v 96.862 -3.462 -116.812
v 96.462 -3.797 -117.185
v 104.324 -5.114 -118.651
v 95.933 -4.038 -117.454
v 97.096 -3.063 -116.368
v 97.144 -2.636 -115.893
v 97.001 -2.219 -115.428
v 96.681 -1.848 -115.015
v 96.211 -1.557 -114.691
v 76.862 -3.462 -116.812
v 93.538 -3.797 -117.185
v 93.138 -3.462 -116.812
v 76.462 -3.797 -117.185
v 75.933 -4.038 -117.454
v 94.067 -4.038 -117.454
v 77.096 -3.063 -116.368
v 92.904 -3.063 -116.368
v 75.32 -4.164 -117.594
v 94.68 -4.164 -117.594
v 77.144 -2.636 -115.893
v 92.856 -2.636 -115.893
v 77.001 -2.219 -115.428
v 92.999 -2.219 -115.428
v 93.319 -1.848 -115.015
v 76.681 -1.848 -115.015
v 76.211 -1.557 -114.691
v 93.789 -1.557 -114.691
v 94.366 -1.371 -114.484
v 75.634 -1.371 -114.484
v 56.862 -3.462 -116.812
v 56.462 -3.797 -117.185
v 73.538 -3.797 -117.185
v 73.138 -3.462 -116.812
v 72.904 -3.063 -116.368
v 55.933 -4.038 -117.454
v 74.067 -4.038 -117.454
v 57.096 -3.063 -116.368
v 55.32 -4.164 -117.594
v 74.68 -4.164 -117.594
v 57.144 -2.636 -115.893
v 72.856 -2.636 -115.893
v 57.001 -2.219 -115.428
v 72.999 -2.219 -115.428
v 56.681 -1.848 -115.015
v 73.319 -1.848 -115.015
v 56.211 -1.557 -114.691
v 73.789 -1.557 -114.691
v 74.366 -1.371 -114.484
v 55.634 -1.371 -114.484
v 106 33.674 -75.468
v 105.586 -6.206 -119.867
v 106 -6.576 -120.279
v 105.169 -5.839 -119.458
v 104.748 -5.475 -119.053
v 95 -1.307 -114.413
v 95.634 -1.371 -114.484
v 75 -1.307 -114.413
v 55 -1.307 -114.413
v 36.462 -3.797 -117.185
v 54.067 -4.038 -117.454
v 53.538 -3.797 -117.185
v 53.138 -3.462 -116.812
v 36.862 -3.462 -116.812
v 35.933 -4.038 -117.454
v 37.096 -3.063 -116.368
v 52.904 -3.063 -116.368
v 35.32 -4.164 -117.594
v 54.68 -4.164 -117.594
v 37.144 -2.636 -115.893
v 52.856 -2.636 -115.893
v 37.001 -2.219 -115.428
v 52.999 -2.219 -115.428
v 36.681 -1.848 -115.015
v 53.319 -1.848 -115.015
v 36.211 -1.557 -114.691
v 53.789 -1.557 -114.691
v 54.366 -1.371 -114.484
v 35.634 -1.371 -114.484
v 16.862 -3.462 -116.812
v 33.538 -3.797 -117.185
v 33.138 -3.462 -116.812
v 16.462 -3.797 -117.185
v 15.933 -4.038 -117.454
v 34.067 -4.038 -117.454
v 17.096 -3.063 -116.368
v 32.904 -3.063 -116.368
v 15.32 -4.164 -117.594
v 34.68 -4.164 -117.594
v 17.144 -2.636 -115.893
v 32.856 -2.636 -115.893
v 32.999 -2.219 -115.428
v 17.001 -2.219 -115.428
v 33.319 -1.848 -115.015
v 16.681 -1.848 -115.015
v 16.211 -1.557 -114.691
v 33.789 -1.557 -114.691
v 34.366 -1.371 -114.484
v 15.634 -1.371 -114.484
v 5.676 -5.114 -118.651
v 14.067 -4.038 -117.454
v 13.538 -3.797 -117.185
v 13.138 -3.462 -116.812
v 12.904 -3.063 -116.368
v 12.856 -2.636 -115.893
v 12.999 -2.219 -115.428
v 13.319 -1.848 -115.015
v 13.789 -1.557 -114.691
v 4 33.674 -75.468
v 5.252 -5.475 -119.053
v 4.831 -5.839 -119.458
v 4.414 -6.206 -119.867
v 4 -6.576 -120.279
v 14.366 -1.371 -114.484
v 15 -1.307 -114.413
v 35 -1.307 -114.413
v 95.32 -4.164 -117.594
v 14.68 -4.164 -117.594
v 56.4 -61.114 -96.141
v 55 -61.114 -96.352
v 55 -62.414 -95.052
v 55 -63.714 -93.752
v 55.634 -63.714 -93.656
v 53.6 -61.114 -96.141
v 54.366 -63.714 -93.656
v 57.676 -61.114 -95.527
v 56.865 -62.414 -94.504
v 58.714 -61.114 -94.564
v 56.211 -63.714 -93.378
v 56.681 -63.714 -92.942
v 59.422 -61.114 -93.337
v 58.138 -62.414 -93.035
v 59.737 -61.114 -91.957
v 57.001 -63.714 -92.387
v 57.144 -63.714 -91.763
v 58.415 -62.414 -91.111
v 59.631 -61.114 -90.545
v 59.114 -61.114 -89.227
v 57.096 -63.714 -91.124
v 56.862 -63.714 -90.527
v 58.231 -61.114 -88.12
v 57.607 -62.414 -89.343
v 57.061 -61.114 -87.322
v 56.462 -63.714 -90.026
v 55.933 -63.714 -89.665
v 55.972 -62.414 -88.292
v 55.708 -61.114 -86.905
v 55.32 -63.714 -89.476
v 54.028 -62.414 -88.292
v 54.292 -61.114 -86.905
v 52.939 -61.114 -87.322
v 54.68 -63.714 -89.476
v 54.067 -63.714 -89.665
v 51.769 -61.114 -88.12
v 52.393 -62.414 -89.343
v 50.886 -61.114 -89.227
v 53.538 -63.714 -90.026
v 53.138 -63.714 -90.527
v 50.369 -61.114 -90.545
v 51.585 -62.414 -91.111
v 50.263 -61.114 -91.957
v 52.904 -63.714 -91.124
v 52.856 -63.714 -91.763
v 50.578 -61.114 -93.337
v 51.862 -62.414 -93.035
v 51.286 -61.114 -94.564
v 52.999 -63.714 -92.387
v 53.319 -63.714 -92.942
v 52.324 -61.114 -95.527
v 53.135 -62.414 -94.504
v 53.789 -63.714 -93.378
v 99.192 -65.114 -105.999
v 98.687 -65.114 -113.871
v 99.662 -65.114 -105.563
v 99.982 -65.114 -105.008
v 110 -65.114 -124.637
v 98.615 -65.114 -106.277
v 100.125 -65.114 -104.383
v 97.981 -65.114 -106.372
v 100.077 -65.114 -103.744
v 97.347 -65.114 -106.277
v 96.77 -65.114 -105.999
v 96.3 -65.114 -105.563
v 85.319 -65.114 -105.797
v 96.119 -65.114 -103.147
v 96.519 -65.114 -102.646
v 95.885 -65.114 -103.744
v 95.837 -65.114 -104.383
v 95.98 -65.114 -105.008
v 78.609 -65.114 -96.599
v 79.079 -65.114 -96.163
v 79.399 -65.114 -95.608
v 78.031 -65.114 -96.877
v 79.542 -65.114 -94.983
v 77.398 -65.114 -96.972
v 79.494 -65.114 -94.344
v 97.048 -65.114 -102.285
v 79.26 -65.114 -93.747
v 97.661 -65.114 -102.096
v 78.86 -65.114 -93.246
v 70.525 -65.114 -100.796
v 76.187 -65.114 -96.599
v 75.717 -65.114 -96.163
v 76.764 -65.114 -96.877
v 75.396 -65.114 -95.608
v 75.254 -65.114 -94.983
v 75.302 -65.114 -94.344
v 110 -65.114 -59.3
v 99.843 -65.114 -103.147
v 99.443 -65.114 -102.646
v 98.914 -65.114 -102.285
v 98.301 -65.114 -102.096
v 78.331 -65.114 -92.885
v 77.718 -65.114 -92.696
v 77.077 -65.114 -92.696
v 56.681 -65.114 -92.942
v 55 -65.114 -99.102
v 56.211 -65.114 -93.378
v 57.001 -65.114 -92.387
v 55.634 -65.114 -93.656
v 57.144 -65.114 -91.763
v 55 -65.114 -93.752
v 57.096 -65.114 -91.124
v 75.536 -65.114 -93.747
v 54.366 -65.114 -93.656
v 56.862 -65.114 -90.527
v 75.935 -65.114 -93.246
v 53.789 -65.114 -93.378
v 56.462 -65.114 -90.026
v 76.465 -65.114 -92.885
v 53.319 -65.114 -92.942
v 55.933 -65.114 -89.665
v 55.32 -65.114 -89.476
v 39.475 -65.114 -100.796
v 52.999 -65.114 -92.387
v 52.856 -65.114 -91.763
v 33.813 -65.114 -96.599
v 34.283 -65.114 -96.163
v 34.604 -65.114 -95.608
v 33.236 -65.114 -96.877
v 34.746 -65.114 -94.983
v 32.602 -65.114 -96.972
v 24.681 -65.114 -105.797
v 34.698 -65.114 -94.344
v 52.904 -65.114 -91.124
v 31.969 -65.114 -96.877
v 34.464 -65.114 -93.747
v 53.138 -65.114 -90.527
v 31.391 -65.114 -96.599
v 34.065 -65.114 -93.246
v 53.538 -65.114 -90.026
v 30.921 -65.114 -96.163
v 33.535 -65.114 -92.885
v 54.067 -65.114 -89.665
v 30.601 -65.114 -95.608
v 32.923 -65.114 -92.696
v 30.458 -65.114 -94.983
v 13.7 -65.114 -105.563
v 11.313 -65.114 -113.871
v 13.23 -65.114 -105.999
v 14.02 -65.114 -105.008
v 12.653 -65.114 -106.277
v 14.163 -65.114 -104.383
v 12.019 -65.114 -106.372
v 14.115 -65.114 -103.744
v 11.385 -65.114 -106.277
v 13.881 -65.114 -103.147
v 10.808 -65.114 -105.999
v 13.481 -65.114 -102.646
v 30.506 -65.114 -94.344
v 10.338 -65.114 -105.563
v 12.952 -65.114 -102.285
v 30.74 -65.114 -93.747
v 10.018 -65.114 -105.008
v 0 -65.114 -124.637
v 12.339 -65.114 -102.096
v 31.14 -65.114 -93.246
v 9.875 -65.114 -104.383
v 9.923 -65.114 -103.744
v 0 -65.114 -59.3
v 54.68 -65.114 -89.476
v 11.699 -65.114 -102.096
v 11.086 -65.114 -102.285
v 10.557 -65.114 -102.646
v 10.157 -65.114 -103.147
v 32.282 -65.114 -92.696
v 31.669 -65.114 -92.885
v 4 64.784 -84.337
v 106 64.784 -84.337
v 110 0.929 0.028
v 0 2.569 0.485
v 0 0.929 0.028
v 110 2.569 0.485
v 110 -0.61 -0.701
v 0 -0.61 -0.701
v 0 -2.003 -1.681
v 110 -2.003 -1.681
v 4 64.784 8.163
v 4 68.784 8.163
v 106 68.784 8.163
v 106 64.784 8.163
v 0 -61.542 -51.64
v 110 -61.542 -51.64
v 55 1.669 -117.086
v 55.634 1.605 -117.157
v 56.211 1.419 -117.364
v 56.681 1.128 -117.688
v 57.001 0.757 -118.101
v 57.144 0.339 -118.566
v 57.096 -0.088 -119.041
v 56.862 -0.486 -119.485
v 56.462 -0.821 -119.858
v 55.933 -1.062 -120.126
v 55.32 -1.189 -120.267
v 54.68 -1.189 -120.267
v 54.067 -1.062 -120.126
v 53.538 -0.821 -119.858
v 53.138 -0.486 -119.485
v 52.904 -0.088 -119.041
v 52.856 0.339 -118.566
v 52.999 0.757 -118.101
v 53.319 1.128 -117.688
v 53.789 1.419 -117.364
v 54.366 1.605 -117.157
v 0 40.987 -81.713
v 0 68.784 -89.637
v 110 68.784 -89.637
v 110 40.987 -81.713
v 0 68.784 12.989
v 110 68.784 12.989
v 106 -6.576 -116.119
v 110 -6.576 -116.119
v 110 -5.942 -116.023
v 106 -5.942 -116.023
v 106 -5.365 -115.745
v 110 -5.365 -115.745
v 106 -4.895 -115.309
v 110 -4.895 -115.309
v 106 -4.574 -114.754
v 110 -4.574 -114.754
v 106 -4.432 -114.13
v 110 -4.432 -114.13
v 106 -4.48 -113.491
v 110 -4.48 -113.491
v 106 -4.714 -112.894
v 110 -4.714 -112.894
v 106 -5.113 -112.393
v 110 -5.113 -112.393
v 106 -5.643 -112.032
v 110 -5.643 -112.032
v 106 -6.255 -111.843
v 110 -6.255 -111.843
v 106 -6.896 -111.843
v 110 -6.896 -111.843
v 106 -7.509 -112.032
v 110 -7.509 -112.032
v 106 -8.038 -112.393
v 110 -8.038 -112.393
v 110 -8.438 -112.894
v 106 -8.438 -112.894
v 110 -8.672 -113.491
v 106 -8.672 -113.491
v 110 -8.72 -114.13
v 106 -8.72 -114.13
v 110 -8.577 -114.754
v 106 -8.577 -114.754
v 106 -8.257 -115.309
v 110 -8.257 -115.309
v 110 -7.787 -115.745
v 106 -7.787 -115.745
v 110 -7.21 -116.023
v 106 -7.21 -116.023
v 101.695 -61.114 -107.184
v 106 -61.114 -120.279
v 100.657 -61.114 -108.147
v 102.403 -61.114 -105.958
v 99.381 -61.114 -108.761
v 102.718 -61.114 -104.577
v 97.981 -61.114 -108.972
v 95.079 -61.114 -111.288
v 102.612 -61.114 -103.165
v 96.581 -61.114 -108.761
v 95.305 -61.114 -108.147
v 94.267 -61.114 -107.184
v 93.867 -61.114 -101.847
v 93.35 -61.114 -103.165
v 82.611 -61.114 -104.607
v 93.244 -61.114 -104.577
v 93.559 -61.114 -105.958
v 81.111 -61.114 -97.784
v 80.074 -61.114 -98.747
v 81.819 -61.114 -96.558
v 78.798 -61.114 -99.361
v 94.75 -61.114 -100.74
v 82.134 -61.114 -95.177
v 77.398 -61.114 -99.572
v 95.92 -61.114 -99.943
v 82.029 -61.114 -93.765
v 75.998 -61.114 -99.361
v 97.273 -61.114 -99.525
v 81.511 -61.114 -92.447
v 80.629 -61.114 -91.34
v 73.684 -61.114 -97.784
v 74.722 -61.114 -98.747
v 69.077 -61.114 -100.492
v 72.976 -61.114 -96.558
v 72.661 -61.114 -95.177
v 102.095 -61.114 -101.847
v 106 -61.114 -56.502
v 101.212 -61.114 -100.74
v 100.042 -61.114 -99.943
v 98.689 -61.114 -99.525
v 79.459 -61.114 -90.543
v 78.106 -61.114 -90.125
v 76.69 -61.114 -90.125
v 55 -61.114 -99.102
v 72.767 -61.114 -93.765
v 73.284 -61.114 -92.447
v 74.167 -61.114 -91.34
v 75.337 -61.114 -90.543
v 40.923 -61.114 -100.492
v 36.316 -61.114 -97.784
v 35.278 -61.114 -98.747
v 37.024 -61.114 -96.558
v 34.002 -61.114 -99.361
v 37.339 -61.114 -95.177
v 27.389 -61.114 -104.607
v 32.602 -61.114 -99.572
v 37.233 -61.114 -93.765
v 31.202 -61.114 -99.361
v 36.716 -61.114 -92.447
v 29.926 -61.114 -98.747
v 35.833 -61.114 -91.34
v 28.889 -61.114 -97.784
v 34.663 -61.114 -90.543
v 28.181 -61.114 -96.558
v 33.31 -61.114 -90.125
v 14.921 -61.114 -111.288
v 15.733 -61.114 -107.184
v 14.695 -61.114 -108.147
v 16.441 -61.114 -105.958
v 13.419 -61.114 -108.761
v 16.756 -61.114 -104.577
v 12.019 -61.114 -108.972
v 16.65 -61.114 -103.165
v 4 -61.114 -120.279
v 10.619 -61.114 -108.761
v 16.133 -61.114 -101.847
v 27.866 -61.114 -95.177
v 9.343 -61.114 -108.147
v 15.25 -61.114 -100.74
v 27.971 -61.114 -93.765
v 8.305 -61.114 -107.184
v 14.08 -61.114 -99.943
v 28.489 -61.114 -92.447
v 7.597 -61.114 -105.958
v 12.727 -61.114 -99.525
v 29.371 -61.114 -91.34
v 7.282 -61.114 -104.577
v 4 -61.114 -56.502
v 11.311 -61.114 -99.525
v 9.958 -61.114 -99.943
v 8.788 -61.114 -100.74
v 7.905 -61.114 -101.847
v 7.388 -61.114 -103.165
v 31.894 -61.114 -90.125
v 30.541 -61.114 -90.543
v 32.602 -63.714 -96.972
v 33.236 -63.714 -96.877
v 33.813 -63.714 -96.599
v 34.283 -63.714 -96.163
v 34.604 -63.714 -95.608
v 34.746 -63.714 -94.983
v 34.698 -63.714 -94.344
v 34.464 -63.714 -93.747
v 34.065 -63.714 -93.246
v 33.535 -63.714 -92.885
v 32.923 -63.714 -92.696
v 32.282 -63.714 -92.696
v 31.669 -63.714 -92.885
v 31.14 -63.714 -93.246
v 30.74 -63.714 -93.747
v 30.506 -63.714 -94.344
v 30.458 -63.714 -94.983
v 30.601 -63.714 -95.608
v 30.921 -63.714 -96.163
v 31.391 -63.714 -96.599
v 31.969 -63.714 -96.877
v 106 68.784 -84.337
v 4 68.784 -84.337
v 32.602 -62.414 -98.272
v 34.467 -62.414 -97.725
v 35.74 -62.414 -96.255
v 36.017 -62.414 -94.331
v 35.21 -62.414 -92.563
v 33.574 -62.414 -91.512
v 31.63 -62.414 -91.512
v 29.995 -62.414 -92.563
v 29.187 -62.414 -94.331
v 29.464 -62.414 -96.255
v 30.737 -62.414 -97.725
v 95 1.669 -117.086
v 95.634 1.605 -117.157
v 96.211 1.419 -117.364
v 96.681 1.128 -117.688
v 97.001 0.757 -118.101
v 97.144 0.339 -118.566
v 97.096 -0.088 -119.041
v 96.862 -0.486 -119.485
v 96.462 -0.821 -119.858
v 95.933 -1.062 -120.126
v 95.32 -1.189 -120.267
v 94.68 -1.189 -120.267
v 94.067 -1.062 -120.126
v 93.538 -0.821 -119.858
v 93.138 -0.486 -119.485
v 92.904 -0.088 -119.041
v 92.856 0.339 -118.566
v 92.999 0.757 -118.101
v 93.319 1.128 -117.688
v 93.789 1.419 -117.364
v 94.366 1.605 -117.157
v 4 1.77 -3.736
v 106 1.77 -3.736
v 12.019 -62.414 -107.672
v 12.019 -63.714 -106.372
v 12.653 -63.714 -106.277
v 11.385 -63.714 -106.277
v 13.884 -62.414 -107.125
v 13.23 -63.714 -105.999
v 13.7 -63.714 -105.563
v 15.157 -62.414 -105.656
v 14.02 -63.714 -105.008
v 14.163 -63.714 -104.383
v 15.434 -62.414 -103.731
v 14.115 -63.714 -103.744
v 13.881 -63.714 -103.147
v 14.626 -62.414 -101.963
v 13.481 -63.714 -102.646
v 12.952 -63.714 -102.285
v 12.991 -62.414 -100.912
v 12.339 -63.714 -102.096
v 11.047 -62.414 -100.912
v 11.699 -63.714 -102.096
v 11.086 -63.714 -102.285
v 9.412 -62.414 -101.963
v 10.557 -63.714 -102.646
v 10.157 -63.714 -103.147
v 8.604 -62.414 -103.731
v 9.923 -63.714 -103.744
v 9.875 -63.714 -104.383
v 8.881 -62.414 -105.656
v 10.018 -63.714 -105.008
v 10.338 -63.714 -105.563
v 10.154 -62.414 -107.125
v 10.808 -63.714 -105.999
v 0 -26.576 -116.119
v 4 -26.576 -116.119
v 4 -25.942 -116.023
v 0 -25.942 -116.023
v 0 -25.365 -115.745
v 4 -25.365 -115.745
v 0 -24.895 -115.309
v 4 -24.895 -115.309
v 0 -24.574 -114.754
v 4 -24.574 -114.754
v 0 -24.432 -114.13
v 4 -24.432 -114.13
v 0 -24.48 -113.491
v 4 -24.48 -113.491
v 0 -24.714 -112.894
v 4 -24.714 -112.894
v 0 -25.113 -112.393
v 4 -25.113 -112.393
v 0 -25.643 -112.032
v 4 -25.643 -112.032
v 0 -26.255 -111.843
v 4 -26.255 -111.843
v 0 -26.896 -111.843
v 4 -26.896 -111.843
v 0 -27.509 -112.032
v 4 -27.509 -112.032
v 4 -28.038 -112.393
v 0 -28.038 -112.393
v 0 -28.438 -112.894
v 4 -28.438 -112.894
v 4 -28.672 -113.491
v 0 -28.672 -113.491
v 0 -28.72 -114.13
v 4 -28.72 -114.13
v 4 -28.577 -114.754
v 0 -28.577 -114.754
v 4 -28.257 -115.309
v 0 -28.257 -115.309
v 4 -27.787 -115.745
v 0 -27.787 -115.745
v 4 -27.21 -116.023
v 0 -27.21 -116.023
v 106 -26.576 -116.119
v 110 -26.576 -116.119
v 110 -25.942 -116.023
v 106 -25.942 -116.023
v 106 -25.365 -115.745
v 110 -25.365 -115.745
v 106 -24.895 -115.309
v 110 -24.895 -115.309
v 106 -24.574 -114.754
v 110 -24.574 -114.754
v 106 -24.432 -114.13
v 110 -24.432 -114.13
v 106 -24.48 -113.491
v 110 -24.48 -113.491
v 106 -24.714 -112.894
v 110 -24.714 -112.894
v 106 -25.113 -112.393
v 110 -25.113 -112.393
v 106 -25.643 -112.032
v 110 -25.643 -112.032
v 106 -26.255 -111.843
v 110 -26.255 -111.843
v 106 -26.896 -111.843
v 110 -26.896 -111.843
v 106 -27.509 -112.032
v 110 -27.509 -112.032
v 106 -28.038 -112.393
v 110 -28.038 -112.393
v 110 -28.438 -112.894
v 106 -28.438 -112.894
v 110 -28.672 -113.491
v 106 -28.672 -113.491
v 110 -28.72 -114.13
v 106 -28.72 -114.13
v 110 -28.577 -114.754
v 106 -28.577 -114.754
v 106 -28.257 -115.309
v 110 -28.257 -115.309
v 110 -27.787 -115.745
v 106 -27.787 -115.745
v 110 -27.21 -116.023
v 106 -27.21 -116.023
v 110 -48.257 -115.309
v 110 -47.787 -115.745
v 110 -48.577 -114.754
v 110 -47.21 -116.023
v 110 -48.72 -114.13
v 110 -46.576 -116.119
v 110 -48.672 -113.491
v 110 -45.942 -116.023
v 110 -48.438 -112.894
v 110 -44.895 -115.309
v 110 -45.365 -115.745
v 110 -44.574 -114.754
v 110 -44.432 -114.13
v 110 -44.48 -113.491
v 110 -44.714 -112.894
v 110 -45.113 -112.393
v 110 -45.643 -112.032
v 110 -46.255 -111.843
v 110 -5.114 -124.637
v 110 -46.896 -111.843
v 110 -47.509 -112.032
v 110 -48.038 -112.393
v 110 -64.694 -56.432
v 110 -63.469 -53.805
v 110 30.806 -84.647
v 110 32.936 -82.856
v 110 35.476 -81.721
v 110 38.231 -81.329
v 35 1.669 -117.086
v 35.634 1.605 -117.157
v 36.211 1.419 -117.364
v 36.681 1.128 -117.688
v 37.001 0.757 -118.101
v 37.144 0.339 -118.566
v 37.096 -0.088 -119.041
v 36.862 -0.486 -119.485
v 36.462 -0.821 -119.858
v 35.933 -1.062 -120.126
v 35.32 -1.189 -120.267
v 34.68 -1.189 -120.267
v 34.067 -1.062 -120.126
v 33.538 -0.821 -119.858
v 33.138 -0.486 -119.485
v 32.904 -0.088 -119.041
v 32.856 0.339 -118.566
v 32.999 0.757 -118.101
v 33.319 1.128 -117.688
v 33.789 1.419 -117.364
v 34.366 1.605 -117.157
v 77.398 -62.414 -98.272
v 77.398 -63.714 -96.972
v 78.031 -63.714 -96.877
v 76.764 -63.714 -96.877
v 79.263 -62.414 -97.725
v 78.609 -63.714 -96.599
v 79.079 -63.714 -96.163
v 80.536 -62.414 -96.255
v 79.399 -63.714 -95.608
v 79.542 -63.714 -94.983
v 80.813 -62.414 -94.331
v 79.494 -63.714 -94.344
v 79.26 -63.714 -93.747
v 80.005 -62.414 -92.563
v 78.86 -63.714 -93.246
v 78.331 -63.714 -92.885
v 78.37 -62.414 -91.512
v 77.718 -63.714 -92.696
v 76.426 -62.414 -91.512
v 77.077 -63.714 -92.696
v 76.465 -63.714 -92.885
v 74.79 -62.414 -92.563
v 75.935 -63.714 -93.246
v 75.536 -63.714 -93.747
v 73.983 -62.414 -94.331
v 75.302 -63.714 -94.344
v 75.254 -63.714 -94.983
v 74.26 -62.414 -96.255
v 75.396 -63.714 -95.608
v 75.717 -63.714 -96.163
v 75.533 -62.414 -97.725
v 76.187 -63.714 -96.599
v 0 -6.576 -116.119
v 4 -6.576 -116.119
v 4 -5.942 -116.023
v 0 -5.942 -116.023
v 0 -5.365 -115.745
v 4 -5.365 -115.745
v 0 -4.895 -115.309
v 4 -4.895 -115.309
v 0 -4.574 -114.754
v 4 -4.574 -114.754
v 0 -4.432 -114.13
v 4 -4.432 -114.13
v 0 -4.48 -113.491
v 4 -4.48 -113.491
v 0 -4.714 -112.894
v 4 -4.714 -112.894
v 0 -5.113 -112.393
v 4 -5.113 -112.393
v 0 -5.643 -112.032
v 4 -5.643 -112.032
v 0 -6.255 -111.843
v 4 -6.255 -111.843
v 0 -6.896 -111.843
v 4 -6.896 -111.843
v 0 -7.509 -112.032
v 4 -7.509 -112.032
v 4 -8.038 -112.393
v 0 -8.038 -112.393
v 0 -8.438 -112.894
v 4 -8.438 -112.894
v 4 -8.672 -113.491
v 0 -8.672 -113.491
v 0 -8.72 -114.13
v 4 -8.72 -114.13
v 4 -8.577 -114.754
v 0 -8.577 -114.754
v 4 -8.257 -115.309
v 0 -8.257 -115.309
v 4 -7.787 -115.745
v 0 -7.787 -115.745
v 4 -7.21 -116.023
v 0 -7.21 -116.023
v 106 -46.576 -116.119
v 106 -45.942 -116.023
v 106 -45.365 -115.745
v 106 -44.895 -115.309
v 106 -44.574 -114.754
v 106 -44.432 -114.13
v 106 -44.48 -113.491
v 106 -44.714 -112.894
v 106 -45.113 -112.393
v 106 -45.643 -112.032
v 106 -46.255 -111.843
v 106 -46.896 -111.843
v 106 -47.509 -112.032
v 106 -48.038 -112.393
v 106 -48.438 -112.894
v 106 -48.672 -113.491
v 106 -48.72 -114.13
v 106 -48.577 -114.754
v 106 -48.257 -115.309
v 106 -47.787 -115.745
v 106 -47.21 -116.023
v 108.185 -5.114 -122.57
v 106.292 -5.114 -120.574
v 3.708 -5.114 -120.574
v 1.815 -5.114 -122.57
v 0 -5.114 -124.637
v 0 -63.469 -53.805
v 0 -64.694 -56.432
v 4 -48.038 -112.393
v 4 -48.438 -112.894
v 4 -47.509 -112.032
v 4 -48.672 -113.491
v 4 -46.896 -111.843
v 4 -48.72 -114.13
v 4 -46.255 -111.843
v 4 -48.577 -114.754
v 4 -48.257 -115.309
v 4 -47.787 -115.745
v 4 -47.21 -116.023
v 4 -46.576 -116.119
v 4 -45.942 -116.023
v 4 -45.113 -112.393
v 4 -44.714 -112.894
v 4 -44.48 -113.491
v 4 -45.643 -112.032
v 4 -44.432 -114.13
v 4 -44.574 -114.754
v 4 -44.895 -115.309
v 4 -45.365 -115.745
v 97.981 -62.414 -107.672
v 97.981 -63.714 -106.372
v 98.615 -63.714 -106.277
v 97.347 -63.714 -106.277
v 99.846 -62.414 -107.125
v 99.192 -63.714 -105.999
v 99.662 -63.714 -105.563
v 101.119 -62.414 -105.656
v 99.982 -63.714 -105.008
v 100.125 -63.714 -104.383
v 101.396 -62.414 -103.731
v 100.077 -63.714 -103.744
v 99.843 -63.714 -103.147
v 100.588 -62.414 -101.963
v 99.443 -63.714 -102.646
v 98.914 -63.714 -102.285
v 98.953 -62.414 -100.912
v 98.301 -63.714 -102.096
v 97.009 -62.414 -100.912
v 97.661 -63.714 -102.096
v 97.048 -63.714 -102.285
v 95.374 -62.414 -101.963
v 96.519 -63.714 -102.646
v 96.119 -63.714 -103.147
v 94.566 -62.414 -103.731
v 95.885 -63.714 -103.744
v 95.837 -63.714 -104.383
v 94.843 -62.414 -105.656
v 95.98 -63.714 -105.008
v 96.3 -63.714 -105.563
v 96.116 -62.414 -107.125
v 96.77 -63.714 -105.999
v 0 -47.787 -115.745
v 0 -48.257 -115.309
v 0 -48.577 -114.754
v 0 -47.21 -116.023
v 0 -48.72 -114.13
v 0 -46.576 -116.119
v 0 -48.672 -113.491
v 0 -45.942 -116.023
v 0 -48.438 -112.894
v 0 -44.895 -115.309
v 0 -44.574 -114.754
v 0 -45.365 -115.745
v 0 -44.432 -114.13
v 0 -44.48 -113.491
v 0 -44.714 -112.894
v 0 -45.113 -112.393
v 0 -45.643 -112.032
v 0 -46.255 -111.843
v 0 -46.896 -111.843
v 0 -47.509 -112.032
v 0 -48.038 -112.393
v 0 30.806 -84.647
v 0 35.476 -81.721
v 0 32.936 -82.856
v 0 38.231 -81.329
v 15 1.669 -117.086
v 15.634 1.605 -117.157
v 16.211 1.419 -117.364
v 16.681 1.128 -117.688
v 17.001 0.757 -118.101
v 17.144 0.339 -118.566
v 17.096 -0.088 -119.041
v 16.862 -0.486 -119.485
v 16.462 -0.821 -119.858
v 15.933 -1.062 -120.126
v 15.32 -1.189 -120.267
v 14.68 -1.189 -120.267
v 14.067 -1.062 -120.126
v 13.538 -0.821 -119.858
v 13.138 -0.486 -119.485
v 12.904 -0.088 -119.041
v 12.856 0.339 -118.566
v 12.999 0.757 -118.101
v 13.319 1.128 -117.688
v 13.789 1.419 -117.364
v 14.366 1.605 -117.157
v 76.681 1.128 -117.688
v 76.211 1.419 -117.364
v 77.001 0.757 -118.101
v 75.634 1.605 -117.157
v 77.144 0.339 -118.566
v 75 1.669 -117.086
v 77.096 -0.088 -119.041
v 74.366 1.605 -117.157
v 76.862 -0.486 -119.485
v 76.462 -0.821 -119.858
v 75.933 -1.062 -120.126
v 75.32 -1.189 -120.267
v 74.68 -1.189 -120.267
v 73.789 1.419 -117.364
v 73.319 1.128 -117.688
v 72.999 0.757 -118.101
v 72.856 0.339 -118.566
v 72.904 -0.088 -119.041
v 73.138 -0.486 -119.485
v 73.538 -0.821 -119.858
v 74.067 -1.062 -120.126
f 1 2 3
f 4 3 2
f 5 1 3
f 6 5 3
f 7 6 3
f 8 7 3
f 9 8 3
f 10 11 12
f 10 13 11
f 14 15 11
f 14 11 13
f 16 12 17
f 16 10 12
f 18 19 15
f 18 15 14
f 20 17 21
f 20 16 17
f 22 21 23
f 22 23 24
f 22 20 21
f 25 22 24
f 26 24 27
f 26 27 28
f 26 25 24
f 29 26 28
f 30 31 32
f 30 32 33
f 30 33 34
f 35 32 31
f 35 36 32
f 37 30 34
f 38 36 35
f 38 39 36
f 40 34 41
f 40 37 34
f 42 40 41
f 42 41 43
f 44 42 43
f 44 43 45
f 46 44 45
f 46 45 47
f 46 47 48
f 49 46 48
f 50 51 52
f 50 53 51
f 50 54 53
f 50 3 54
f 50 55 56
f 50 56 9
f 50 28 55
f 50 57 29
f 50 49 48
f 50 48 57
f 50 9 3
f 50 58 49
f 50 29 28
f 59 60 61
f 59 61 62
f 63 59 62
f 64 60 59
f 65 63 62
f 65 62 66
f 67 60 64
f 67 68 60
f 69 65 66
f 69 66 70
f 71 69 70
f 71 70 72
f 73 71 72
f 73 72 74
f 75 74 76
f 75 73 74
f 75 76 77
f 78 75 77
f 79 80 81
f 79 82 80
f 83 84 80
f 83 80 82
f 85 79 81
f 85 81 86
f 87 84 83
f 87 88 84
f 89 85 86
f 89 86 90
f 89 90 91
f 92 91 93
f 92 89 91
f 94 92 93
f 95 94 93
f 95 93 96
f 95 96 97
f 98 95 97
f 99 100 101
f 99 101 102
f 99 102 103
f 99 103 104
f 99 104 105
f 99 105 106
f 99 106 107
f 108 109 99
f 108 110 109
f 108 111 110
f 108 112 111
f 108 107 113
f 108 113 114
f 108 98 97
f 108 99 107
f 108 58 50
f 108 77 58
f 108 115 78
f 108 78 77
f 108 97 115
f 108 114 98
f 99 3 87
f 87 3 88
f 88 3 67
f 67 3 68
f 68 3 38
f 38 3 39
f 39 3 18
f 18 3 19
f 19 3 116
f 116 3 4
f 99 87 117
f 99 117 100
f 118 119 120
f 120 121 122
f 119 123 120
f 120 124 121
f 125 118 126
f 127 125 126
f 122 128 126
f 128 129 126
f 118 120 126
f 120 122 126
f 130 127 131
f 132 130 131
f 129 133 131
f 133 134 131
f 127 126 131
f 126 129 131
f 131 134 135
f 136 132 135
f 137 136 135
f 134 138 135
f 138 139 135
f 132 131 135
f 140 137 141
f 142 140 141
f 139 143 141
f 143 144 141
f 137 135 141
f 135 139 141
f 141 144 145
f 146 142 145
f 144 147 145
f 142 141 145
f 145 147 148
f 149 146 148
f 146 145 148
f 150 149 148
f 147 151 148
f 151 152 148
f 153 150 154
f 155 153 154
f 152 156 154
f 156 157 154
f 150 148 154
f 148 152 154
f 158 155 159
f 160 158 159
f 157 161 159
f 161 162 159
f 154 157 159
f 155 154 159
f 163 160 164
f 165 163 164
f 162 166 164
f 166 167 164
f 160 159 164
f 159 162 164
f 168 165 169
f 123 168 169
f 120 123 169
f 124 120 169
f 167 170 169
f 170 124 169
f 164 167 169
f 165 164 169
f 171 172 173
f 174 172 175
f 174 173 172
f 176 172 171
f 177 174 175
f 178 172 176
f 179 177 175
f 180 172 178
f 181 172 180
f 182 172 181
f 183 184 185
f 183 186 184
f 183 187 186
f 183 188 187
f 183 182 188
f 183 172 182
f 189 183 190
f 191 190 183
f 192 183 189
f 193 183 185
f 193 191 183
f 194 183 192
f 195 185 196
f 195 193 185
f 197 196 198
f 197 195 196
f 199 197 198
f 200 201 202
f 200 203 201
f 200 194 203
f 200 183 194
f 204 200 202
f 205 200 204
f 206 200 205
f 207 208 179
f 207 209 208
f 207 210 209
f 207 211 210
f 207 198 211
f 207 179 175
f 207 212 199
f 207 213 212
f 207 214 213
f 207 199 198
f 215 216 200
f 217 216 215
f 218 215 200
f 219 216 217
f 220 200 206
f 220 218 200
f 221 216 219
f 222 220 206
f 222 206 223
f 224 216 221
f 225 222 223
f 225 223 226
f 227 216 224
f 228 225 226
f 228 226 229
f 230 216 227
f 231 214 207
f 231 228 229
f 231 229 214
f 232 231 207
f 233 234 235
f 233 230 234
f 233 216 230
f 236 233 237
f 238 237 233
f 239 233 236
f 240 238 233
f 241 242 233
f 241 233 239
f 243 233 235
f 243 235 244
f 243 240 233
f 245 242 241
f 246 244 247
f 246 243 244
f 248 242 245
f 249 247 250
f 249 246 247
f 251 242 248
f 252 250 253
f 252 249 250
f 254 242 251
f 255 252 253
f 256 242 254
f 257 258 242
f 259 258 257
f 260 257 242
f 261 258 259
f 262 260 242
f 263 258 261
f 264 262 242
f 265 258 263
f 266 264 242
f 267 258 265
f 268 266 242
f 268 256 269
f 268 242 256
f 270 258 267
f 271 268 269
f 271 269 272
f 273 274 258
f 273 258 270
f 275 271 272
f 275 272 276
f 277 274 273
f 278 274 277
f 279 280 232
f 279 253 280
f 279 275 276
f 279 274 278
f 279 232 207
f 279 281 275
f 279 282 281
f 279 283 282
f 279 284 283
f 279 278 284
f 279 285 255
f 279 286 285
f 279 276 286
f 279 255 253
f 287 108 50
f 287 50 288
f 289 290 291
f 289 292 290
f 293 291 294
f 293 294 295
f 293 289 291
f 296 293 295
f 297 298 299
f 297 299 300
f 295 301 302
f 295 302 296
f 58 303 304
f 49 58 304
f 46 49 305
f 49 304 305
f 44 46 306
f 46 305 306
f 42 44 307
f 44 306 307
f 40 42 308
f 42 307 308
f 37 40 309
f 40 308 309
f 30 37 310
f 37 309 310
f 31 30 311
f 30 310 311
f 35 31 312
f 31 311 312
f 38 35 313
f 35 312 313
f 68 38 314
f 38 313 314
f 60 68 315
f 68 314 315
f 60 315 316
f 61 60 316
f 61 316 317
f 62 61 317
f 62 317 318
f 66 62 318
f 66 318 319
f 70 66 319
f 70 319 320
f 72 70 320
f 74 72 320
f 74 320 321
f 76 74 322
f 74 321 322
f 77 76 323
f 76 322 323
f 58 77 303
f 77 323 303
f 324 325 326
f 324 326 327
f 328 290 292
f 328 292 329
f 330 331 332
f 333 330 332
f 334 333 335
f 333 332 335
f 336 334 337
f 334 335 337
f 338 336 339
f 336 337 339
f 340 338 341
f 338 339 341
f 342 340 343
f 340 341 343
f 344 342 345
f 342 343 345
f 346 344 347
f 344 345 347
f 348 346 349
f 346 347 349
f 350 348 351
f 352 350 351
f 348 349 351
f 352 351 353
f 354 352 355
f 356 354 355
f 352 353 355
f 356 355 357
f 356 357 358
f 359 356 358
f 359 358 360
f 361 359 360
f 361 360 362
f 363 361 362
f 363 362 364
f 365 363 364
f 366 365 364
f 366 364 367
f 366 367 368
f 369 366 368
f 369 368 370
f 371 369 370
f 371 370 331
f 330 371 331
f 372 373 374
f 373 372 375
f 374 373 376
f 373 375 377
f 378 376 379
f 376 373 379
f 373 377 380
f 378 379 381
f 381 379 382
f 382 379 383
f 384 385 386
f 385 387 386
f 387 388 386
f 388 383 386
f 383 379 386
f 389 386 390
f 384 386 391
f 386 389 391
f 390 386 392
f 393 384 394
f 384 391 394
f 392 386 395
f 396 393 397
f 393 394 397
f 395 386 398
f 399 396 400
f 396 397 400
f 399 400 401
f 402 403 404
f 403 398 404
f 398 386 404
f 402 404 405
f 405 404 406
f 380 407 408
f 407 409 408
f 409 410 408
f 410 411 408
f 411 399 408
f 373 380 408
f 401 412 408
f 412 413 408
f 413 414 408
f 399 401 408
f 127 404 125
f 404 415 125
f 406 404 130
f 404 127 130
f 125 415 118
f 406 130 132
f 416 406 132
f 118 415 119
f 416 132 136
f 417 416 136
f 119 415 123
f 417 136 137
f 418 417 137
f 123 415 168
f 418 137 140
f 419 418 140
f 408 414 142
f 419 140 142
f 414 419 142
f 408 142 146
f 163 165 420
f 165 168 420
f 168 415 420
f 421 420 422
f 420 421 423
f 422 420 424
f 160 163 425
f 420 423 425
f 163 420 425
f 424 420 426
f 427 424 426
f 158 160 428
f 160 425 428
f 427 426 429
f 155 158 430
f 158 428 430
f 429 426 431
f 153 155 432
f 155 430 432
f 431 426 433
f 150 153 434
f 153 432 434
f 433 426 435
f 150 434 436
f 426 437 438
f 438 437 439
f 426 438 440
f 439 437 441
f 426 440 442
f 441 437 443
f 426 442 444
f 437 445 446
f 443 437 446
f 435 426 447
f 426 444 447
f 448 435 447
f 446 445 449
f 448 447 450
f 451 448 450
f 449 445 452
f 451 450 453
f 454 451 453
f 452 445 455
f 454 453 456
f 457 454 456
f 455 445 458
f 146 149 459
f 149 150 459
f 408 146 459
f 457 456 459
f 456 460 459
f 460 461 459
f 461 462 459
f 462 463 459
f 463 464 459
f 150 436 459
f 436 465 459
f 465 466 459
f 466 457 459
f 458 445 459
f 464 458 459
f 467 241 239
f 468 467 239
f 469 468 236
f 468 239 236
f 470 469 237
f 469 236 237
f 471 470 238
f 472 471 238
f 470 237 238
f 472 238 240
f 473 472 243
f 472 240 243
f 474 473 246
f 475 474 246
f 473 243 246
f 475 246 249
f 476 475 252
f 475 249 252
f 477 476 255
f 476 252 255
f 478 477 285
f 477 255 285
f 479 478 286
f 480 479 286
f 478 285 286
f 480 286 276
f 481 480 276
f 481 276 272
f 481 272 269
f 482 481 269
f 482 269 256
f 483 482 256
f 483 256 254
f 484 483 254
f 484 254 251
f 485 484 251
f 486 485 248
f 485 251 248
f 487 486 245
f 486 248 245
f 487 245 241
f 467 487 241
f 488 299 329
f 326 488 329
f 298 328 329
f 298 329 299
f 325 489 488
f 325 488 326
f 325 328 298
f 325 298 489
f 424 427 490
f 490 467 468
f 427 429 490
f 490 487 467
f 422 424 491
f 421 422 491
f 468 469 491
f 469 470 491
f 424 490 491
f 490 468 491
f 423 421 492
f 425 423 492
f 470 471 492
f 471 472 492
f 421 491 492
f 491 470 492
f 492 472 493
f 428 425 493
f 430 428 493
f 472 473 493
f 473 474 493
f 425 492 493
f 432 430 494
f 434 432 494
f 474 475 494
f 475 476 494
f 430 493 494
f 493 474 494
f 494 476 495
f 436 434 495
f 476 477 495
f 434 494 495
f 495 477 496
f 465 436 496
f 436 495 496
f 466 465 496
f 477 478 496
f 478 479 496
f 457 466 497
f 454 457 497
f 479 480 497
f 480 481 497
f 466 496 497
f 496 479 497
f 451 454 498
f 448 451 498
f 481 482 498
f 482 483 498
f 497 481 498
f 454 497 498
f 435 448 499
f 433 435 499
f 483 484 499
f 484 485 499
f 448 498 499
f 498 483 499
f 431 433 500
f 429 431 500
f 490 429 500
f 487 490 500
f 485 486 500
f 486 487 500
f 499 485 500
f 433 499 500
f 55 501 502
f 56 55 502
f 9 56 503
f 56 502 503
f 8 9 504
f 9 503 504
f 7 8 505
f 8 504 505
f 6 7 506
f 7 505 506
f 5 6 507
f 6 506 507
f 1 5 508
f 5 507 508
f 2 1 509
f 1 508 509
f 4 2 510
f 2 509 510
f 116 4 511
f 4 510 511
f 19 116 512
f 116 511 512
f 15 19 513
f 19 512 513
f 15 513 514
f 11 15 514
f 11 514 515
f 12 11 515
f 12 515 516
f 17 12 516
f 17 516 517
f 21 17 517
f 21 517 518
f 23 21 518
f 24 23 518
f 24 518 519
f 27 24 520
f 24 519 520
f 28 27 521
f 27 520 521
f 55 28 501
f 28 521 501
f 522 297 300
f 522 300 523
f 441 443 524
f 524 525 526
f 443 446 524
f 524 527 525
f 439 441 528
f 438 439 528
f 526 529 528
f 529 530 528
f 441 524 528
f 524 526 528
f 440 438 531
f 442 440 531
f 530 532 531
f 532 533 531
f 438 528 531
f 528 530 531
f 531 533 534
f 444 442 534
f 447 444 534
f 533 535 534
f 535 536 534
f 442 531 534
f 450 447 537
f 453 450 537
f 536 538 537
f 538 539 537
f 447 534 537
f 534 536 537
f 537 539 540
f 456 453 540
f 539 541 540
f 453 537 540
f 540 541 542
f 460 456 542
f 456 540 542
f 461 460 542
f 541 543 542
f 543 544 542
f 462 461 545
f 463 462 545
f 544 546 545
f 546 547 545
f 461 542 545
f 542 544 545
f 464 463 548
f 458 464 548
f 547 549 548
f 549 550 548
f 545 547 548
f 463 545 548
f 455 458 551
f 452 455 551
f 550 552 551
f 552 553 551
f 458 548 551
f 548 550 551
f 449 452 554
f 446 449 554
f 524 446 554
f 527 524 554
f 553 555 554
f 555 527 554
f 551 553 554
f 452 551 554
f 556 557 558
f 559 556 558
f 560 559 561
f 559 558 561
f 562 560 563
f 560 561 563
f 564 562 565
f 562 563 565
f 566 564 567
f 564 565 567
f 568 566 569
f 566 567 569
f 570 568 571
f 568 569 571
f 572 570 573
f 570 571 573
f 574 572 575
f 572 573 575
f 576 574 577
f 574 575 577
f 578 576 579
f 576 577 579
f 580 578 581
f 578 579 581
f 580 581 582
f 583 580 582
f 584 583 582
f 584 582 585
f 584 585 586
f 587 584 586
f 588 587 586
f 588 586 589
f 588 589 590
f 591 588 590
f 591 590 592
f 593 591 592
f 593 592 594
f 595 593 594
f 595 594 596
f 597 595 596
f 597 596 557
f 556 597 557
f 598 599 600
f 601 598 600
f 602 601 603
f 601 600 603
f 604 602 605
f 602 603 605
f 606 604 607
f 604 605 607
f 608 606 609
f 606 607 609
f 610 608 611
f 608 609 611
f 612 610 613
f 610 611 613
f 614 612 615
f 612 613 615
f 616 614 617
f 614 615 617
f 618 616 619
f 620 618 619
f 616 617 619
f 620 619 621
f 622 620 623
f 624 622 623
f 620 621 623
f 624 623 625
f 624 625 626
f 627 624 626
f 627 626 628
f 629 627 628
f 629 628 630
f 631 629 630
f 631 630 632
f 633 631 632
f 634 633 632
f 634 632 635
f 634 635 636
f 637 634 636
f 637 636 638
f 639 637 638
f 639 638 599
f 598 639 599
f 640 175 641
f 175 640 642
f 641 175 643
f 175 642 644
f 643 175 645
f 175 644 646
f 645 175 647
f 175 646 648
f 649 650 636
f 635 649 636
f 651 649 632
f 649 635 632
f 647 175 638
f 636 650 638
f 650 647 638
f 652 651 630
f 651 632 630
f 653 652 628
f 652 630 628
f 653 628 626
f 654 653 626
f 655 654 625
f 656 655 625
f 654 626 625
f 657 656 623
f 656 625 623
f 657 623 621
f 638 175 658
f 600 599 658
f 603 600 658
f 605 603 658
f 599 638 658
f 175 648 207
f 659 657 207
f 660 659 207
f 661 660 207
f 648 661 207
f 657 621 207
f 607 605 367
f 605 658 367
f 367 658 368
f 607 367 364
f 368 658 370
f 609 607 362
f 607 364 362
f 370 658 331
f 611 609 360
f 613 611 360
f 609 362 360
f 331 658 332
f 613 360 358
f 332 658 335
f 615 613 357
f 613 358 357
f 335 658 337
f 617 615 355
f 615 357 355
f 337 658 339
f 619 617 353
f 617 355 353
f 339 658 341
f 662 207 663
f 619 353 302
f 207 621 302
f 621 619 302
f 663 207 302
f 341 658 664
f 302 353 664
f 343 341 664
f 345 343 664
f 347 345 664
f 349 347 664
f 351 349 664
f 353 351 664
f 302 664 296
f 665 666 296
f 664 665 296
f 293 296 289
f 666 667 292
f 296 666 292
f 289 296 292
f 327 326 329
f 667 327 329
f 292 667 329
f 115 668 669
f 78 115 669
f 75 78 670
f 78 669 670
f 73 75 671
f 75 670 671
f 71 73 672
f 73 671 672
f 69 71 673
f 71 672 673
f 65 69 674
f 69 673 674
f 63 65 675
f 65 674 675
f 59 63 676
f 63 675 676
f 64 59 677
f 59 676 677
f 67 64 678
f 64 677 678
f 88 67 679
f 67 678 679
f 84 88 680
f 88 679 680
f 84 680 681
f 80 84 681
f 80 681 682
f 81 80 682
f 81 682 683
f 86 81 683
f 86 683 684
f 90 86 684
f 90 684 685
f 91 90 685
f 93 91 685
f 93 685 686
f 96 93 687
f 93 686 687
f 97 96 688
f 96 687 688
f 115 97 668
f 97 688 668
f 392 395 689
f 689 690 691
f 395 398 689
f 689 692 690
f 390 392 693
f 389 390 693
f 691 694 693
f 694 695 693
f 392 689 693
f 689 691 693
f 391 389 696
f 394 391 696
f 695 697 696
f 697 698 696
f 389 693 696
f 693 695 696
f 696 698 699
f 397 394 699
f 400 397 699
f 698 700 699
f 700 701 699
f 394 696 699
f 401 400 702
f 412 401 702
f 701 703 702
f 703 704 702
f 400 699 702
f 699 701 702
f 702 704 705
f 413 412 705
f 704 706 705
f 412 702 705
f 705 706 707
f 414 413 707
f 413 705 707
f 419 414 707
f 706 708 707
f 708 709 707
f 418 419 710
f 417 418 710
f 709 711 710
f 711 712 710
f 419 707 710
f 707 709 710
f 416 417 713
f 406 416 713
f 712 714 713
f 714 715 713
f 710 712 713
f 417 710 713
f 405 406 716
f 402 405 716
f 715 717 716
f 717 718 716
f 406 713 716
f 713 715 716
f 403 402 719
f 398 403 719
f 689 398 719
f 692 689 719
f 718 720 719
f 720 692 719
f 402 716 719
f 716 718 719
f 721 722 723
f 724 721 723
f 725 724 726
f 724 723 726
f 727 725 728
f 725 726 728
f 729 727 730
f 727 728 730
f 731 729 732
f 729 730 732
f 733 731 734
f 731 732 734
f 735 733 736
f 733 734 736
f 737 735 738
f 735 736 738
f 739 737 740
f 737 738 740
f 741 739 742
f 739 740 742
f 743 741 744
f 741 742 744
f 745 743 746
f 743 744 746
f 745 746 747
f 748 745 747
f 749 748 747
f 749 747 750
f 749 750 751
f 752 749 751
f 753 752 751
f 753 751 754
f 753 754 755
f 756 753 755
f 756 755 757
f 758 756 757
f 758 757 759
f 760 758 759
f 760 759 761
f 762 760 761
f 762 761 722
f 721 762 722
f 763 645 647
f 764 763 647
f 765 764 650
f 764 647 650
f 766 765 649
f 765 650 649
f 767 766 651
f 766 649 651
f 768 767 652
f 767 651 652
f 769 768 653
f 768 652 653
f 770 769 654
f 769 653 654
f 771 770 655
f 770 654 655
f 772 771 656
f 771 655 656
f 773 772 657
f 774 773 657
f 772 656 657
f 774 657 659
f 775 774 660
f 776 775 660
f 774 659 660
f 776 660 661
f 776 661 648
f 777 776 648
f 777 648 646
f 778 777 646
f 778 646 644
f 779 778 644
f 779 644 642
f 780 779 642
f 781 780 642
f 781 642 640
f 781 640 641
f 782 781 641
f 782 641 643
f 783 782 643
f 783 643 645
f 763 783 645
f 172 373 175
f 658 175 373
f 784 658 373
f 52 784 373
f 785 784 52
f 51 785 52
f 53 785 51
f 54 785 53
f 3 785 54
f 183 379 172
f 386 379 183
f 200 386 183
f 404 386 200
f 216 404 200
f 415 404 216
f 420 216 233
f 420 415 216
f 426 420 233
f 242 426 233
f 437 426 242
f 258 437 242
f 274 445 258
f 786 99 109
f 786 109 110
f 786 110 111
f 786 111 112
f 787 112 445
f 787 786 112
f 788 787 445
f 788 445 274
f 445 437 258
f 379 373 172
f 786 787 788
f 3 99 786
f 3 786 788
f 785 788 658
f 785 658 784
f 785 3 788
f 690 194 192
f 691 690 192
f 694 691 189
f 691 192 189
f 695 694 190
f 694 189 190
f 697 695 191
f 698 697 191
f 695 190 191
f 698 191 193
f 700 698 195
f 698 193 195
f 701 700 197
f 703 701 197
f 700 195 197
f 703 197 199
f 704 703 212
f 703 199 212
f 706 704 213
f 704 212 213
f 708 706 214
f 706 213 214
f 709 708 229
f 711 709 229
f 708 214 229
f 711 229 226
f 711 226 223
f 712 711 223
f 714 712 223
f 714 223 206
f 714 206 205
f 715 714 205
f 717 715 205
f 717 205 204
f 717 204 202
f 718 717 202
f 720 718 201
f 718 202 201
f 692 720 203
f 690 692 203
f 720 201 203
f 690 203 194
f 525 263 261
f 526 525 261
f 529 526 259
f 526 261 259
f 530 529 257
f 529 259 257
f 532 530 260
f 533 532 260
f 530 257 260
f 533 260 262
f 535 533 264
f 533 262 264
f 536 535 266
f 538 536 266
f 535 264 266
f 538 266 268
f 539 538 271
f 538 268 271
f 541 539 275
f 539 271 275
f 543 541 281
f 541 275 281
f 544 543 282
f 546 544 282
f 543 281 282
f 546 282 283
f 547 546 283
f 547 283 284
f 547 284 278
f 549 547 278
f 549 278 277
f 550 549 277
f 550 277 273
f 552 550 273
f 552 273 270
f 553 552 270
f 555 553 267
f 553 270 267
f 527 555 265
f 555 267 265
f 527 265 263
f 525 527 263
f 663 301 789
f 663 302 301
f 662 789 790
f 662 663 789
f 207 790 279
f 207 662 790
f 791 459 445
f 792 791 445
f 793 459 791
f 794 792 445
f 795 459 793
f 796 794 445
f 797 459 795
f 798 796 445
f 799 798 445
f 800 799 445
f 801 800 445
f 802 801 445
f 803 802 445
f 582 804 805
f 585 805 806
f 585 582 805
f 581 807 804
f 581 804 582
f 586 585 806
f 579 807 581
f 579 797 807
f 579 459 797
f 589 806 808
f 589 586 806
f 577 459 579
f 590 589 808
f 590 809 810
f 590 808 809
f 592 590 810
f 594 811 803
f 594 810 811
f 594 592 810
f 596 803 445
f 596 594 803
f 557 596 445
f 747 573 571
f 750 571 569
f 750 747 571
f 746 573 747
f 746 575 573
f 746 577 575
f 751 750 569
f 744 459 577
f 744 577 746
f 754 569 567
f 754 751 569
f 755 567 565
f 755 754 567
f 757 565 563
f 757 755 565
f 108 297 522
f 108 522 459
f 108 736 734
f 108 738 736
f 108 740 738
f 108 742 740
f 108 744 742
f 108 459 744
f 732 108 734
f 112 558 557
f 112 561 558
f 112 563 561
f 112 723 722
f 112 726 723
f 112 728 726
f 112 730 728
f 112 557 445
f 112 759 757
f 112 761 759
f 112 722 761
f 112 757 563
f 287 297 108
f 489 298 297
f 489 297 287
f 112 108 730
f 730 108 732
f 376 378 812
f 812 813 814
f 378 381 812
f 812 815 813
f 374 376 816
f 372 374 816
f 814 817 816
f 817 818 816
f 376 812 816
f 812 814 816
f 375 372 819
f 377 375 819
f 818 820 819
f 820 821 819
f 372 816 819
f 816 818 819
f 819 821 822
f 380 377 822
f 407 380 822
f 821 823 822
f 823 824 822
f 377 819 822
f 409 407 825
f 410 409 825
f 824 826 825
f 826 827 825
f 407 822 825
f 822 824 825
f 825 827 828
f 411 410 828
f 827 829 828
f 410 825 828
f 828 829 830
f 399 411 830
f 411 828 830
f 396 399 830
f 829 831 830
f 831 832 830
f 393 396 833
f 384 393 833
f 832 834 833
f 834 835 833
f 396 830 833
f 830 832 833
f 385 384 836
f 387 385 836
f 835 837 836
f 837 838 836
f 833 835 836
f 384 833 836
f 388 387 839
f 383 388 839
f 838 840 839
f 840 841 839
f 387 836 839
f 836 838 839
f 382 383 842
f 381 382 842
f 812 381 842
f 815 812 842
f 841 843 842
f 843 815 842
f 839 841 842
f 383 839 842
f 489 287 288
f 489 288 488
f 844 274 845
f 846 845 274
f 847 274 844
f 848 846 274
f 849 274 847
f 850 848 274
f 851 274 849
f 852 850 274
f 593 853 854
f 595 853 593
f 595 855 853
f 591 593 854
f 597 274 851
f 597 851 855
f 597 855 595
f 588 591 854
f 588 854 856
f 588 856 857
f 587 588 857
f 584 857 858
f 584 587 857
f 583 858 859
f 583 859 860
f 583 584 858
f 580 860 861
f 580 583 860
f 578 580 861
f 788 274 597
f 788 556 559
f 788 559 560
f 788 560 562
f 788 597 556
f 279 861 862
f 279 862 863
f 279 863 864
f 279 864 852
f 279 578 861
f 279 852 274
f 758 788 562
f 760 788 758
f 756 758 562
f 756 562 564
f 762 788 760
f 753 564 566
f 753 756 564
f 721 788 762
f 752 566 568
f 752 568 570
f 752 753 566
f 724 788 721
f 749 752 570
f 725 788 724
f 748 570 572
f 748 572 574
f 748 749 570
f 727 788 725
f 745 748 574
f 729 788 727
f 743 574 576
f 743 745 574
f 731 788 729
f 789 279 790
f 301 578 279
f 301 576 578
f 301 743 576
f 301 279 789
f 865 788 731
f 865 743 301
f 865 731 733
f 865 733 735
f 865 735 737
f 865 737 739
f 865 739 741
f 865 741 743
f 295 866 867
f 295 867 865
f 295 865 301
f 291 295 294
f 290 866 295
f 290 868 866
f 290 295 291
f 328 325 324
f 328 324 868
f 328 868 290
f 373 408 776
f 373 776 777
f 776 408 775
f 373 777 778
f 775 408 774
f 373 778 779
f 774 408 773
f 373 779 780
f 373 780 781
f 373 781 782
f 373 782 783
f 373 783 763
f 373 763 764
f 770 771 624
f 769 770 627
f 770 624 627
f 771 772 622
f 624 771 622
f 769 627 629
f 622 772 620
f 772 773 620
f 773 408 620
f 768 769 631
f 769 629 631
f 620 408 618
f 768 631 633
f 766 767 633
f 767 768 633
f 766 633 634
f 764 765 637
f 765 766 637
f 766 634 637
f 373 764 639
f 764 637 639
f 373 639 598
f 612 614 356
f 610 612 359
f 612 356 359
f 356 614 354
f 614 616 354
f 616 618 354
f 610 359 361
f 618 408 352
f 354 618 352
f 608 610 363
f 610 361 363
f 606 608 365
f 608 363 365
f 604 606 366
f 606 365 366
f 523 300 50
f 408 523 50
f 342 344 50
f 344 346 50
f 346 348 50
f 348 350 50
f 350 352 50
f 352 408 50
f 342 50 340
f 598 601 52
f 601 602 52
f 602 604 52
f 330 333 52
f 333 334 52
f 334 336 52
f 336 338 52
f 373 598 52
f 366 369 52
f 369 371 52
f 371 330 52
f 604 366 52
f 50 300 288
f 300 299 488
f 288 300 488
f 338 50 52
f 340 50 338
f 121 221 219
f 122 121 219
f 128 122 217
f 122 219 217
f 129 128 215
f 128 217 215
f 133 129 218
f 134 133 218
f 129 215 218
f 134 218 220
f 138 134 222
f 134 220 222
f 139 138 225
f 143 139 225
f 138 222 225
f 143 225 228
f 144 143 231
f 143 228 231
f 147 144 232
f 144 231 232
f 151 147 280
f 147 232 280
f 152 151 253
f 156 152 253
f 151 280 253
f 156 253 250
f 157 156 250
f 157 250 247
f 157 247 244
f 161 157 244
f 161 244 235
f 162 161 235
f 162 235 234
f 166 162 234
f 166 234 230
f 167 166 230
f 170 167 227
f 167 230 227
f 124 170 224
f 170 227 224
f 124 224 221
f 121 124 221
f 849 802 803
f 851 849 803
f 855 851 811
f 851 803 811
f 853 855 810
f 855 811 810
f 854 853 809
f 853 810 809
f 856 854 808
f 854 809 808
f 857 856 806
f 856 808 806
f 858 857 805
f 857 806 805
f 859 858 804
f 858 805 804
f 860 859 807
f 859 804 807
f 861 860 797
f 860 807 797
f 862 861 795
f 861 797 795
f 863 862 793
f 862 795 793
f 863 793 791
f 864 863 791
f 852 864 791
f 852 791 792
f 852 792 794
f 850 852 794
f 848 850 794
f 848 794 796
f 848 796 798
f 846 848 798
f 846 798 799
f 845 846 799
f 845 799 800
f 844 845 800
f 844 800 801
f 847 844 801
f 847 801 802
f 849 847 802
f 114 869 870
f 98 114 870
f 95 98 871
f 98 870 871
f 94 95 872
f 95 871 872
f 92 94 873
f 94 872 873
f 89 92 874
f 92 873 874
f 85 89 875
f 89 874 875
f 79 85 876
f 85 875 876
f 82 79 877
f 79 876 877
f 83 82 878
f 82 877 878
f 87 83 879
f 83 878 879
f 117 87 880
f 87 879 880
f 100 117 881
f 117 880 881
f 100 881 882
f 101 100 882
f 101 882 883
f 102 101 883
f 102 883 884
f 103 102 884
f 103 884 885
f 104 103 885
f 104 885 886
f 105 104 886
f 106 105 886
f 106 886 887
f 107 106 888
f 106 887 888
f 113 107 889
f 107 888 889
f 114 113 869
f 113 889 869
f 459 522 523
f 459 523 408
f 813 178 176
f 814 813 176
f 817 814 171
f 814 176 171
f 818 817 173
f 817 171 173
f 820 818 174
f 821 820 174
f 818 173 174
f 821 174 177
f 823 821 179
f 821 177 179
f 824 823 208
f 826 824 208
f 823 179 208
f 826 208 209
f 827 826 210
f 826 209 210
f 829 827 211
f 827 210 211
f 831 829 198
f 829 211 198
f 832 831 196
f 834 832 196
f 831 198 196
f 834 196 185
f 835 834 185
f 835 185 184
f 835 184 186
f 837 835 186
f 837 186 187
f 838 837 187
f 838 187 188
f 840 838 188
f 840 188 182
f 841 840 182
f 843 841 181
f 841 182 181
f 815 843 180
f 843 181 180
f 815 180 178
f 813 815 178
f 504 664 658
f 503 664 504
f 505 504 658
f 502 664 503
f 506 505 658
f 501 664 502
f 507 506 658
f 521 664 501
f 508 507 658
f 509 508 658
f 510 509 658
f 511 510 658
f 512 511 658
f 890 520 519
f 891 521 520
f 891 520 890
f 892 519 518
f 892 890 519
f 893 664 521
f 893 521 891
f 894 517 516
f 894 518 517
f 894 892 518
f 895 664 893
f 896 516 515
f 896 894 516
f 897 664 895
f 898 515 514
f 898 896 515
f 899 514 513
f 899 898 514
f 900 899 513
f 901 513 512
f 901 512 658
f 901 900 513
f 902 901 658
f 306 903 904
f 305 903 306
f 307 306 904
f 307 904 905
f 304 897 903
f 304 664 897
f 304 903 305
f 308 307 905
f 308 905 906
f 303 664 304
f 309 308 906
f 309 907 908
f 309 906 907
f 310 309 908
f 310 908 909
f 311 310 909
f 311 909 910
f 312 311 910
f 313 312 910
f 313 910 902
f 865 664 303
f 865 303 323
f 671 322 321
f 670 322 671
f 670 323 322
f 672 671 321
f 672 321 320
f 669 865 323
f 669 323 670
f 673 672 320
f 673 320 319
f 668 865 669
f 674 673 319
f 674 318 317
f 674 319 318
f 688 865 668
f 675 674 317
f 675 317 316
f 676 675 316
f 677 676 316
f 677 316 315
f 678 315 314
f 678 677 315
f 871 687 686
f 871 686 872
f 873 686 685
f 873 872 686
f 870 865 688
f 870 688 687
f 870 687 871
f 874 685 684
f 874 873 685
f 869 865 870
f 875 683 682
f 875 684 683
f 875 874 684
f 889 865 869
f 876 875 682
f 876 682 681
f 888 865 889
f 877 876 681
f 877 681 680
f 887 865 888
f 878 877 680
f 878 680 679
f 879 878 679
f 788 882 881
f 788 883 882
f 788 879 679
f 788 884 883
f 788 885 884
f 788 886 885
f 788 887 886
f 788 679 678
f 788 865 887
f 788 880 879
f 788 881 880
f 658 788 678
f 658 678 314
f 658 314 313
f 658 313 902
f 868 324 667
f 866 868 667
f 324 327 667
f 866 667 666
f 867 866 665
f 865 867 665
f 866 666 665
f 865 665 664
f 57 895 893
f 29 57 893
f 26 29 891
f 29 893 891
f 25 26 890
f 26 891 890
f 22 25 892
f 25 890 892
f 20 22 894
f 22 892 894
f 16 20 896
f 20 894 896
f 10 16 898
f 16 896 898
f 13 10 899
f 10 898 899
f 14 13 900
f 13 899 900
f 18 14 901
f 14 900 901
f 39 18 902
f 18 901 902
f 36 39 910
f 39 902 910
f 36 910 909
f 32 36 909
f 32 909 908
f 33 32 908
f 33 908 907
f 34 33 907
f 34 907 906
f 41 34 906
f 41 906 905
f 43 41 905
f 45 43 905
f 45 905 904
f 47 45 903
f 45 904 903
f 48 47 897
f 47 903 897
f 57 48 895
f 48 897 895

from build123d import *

# Parameters (mm, degrees)
BOSS_EXTRUDE2_DEPTH = 110
CUT_EXTRUDE1_DEPTH  = 102
CUT_EXTRUDE2_START  = -60
CUT_EXTRUDE2_DEPTH  = 60
FILLET1_R           = 10
SKETCH9_R           = 2.15
CUT_EXTRUDE3_DEPTH  = 4
SKETCH10_R          = 2.15
CUT_EXTRUDE4_DEPTH  = 4
CHAMFER1_SIZE       = 2.6
SKETCH12_R          = 2.15
CUT_EXTRUDE5_DEPTH  = 180.904594821


with BuildPart() as part:
    # Sketch3 → Boss-Extrude2 (new body)
    with BuildSketch(Plane(origin=(0, 0, 0), x_dir=(0, 0, -1), z_dir=(1, 0, 0))):
        Polygon((-12.988659511, 68.784407565), (89.636946823, 68.784407565), (80, 34.980398699), (124.636946823, -5.113777665), (124.636946823, -65.113777665), (54.636946823, -65.113777665), (0, 0), align=None)
    extrude(amount=BOSS_EXTRUDE2_DEPTH)

    # Sketch5 → Cut-Extrude1 (cut)
    with BuildSketch(Plane.ZY.offset(-4)):
        Polygon((-84.337245247, 64.784407565), (-84.337245247, 68.784407565), (8.162643706, 68.784407565), (8.162643706, 64.784407565), (-3.736468645, 1.769945376), (-56.502177456, -61.113777665), (-120.636946823, -61.113777665), (-124.636946823, -61.113777665), (-124.636946823, -10.490489494), (-75.468261848, 33.674223088), align=None)
    extrude(amount=-CUT_EXTRUDE1_DEPTH, mode=Mode.SUBTRACT)

    # Sketch8 → Cut-Extrude2 (cut)
    with BuildSketch(Plane.XZ.offset(65.113777665).offset(CUT_EXTRUDE2_START)):
        with BuildLine():
            Line((0, -124.636946823), (110, -124.636946823))
            ThreePointArc((110, -124.636946823), (55, -99.101987445), (0, -124.636946823))
        make_face()
    extrude(amount=CUT_EXTRUDE2_DEPTH, mode=Mode.SUBTRACT)

    # Fillet1
    fillet1_edges = [part.edges().sort_by_distance(p)[0] for p in [
        (55, 34.980398699, -80),
        (55, -65.113777665, -54.636946823),
        (55, 0, 0),
    ]]
    fillet(fillet1_edges, radius=FILLET1_R)

    # Sketch9 → Cut-Extrude3 (cut)
    with BuildSketch(Plane.XZ.offset(65.113777665)):
        with Locations(Location((55, -91.601987445, 0), (0, 0, 270))):
            Circle(SKETCH9_R)
        with Locations(Location((77.397738269, -94.822296043, 0), (0, 0, 270))):
            Circle(SKETCH9_R)
        with Locations(Location((97.980944988, -104.222331585, 0), (0, 0, 270))):
            Circle(SKETCH9_R)
        with Locations((-23.69080463, -159.787957803)):
            Circle(SKETCH9_R)
        with Locations((-17.315743631, -138.076493912)):
            Circle(SKETCH9_R)
        with Locations((-5.082091161, -119.040559097)):
            Circle(SKETCH9_R)
        with Locations(Location((12.019055012, -104.222331585, 0), (0, 0, 270))):
            Circle(SKETCH9_R)
        with Locations(Location((32.602261731, -94.822296043, 0), (0, 0, 270))):
            Circle(SKETCH9_R)
    extrude(amount=-CUT_EXTRUDE3_DEPTH, mode=Mode.SUBTRACT)

    # Sketch10 → Cut-Extrude4 (cut)
    with BuildSketch(Plane(origin=(0, 59.13096402, -53.113115226), x_dir=(1, 0, 0), z_dir=(0, 0.7439491137225913, -0.6682362727294672))):
        with Locations(Location((55, 88.140757853, 0), (0, 0, 270))):
            Circle(SKETCH10_R)
        with Locations(Location((75, 88.140757853, 0), (0, 0, 270))):
            Circle(SKETCH10_R)
        with Locations(Location((95, 88.140757853, 0), (0, 0, 270))):
            Circle(SKETCH10_R)
        with Locations(Location((35, 88.140757853, 0), (0, 0, 270))):
            Circle(SKETCH10_R)
        with Locations(Location((15, 88.140757853, 0), (0, 0, 270))):
            Circle(SKETCH10_R)
    extrude(amount=-CUT_EXTRUDE4_DEPTH, mode=Mode.SUBTRACT)

    # Chamfer1
    chamfer1_edges = [part.edges().sort_by_distance(p)[0] for p in [
        (97.980944988, -61.113777665, -102.072331585),
        (77.397738269, -61.113777665, -92.672296043),
        (12.019055012, -61.113777665, -102.072331585),
        (32.602261731, -61.113777665, -92.672296043),
        (55, -61.113777665, -89.451987445),
    ]]
    chamfer(chamfer1_edges, length=CHAMFER1_SIZE)

    # Sketch12 → Cut-Extrude5 (cut, through all)
    with BuildSketch(Plane(origin=(110, 0, 0), x_dir=(0, 0, -1), z_dir=(1, 0, 0))):
        with Locations((113.968990901, -26.575845979)):
            Circle(SKETCH12_R)
        with Locations((113.968990901, -6.575845979)):
            Circle(SKETCH12_R)
        with Locations((113.968990901, -46.575845979)):
            Circle(SKETCH12_R)
    extrude(amount=-CUT_EXTRUDE5_DEPTH, mode=Mode.SUBTRACT)


solid = part.part
